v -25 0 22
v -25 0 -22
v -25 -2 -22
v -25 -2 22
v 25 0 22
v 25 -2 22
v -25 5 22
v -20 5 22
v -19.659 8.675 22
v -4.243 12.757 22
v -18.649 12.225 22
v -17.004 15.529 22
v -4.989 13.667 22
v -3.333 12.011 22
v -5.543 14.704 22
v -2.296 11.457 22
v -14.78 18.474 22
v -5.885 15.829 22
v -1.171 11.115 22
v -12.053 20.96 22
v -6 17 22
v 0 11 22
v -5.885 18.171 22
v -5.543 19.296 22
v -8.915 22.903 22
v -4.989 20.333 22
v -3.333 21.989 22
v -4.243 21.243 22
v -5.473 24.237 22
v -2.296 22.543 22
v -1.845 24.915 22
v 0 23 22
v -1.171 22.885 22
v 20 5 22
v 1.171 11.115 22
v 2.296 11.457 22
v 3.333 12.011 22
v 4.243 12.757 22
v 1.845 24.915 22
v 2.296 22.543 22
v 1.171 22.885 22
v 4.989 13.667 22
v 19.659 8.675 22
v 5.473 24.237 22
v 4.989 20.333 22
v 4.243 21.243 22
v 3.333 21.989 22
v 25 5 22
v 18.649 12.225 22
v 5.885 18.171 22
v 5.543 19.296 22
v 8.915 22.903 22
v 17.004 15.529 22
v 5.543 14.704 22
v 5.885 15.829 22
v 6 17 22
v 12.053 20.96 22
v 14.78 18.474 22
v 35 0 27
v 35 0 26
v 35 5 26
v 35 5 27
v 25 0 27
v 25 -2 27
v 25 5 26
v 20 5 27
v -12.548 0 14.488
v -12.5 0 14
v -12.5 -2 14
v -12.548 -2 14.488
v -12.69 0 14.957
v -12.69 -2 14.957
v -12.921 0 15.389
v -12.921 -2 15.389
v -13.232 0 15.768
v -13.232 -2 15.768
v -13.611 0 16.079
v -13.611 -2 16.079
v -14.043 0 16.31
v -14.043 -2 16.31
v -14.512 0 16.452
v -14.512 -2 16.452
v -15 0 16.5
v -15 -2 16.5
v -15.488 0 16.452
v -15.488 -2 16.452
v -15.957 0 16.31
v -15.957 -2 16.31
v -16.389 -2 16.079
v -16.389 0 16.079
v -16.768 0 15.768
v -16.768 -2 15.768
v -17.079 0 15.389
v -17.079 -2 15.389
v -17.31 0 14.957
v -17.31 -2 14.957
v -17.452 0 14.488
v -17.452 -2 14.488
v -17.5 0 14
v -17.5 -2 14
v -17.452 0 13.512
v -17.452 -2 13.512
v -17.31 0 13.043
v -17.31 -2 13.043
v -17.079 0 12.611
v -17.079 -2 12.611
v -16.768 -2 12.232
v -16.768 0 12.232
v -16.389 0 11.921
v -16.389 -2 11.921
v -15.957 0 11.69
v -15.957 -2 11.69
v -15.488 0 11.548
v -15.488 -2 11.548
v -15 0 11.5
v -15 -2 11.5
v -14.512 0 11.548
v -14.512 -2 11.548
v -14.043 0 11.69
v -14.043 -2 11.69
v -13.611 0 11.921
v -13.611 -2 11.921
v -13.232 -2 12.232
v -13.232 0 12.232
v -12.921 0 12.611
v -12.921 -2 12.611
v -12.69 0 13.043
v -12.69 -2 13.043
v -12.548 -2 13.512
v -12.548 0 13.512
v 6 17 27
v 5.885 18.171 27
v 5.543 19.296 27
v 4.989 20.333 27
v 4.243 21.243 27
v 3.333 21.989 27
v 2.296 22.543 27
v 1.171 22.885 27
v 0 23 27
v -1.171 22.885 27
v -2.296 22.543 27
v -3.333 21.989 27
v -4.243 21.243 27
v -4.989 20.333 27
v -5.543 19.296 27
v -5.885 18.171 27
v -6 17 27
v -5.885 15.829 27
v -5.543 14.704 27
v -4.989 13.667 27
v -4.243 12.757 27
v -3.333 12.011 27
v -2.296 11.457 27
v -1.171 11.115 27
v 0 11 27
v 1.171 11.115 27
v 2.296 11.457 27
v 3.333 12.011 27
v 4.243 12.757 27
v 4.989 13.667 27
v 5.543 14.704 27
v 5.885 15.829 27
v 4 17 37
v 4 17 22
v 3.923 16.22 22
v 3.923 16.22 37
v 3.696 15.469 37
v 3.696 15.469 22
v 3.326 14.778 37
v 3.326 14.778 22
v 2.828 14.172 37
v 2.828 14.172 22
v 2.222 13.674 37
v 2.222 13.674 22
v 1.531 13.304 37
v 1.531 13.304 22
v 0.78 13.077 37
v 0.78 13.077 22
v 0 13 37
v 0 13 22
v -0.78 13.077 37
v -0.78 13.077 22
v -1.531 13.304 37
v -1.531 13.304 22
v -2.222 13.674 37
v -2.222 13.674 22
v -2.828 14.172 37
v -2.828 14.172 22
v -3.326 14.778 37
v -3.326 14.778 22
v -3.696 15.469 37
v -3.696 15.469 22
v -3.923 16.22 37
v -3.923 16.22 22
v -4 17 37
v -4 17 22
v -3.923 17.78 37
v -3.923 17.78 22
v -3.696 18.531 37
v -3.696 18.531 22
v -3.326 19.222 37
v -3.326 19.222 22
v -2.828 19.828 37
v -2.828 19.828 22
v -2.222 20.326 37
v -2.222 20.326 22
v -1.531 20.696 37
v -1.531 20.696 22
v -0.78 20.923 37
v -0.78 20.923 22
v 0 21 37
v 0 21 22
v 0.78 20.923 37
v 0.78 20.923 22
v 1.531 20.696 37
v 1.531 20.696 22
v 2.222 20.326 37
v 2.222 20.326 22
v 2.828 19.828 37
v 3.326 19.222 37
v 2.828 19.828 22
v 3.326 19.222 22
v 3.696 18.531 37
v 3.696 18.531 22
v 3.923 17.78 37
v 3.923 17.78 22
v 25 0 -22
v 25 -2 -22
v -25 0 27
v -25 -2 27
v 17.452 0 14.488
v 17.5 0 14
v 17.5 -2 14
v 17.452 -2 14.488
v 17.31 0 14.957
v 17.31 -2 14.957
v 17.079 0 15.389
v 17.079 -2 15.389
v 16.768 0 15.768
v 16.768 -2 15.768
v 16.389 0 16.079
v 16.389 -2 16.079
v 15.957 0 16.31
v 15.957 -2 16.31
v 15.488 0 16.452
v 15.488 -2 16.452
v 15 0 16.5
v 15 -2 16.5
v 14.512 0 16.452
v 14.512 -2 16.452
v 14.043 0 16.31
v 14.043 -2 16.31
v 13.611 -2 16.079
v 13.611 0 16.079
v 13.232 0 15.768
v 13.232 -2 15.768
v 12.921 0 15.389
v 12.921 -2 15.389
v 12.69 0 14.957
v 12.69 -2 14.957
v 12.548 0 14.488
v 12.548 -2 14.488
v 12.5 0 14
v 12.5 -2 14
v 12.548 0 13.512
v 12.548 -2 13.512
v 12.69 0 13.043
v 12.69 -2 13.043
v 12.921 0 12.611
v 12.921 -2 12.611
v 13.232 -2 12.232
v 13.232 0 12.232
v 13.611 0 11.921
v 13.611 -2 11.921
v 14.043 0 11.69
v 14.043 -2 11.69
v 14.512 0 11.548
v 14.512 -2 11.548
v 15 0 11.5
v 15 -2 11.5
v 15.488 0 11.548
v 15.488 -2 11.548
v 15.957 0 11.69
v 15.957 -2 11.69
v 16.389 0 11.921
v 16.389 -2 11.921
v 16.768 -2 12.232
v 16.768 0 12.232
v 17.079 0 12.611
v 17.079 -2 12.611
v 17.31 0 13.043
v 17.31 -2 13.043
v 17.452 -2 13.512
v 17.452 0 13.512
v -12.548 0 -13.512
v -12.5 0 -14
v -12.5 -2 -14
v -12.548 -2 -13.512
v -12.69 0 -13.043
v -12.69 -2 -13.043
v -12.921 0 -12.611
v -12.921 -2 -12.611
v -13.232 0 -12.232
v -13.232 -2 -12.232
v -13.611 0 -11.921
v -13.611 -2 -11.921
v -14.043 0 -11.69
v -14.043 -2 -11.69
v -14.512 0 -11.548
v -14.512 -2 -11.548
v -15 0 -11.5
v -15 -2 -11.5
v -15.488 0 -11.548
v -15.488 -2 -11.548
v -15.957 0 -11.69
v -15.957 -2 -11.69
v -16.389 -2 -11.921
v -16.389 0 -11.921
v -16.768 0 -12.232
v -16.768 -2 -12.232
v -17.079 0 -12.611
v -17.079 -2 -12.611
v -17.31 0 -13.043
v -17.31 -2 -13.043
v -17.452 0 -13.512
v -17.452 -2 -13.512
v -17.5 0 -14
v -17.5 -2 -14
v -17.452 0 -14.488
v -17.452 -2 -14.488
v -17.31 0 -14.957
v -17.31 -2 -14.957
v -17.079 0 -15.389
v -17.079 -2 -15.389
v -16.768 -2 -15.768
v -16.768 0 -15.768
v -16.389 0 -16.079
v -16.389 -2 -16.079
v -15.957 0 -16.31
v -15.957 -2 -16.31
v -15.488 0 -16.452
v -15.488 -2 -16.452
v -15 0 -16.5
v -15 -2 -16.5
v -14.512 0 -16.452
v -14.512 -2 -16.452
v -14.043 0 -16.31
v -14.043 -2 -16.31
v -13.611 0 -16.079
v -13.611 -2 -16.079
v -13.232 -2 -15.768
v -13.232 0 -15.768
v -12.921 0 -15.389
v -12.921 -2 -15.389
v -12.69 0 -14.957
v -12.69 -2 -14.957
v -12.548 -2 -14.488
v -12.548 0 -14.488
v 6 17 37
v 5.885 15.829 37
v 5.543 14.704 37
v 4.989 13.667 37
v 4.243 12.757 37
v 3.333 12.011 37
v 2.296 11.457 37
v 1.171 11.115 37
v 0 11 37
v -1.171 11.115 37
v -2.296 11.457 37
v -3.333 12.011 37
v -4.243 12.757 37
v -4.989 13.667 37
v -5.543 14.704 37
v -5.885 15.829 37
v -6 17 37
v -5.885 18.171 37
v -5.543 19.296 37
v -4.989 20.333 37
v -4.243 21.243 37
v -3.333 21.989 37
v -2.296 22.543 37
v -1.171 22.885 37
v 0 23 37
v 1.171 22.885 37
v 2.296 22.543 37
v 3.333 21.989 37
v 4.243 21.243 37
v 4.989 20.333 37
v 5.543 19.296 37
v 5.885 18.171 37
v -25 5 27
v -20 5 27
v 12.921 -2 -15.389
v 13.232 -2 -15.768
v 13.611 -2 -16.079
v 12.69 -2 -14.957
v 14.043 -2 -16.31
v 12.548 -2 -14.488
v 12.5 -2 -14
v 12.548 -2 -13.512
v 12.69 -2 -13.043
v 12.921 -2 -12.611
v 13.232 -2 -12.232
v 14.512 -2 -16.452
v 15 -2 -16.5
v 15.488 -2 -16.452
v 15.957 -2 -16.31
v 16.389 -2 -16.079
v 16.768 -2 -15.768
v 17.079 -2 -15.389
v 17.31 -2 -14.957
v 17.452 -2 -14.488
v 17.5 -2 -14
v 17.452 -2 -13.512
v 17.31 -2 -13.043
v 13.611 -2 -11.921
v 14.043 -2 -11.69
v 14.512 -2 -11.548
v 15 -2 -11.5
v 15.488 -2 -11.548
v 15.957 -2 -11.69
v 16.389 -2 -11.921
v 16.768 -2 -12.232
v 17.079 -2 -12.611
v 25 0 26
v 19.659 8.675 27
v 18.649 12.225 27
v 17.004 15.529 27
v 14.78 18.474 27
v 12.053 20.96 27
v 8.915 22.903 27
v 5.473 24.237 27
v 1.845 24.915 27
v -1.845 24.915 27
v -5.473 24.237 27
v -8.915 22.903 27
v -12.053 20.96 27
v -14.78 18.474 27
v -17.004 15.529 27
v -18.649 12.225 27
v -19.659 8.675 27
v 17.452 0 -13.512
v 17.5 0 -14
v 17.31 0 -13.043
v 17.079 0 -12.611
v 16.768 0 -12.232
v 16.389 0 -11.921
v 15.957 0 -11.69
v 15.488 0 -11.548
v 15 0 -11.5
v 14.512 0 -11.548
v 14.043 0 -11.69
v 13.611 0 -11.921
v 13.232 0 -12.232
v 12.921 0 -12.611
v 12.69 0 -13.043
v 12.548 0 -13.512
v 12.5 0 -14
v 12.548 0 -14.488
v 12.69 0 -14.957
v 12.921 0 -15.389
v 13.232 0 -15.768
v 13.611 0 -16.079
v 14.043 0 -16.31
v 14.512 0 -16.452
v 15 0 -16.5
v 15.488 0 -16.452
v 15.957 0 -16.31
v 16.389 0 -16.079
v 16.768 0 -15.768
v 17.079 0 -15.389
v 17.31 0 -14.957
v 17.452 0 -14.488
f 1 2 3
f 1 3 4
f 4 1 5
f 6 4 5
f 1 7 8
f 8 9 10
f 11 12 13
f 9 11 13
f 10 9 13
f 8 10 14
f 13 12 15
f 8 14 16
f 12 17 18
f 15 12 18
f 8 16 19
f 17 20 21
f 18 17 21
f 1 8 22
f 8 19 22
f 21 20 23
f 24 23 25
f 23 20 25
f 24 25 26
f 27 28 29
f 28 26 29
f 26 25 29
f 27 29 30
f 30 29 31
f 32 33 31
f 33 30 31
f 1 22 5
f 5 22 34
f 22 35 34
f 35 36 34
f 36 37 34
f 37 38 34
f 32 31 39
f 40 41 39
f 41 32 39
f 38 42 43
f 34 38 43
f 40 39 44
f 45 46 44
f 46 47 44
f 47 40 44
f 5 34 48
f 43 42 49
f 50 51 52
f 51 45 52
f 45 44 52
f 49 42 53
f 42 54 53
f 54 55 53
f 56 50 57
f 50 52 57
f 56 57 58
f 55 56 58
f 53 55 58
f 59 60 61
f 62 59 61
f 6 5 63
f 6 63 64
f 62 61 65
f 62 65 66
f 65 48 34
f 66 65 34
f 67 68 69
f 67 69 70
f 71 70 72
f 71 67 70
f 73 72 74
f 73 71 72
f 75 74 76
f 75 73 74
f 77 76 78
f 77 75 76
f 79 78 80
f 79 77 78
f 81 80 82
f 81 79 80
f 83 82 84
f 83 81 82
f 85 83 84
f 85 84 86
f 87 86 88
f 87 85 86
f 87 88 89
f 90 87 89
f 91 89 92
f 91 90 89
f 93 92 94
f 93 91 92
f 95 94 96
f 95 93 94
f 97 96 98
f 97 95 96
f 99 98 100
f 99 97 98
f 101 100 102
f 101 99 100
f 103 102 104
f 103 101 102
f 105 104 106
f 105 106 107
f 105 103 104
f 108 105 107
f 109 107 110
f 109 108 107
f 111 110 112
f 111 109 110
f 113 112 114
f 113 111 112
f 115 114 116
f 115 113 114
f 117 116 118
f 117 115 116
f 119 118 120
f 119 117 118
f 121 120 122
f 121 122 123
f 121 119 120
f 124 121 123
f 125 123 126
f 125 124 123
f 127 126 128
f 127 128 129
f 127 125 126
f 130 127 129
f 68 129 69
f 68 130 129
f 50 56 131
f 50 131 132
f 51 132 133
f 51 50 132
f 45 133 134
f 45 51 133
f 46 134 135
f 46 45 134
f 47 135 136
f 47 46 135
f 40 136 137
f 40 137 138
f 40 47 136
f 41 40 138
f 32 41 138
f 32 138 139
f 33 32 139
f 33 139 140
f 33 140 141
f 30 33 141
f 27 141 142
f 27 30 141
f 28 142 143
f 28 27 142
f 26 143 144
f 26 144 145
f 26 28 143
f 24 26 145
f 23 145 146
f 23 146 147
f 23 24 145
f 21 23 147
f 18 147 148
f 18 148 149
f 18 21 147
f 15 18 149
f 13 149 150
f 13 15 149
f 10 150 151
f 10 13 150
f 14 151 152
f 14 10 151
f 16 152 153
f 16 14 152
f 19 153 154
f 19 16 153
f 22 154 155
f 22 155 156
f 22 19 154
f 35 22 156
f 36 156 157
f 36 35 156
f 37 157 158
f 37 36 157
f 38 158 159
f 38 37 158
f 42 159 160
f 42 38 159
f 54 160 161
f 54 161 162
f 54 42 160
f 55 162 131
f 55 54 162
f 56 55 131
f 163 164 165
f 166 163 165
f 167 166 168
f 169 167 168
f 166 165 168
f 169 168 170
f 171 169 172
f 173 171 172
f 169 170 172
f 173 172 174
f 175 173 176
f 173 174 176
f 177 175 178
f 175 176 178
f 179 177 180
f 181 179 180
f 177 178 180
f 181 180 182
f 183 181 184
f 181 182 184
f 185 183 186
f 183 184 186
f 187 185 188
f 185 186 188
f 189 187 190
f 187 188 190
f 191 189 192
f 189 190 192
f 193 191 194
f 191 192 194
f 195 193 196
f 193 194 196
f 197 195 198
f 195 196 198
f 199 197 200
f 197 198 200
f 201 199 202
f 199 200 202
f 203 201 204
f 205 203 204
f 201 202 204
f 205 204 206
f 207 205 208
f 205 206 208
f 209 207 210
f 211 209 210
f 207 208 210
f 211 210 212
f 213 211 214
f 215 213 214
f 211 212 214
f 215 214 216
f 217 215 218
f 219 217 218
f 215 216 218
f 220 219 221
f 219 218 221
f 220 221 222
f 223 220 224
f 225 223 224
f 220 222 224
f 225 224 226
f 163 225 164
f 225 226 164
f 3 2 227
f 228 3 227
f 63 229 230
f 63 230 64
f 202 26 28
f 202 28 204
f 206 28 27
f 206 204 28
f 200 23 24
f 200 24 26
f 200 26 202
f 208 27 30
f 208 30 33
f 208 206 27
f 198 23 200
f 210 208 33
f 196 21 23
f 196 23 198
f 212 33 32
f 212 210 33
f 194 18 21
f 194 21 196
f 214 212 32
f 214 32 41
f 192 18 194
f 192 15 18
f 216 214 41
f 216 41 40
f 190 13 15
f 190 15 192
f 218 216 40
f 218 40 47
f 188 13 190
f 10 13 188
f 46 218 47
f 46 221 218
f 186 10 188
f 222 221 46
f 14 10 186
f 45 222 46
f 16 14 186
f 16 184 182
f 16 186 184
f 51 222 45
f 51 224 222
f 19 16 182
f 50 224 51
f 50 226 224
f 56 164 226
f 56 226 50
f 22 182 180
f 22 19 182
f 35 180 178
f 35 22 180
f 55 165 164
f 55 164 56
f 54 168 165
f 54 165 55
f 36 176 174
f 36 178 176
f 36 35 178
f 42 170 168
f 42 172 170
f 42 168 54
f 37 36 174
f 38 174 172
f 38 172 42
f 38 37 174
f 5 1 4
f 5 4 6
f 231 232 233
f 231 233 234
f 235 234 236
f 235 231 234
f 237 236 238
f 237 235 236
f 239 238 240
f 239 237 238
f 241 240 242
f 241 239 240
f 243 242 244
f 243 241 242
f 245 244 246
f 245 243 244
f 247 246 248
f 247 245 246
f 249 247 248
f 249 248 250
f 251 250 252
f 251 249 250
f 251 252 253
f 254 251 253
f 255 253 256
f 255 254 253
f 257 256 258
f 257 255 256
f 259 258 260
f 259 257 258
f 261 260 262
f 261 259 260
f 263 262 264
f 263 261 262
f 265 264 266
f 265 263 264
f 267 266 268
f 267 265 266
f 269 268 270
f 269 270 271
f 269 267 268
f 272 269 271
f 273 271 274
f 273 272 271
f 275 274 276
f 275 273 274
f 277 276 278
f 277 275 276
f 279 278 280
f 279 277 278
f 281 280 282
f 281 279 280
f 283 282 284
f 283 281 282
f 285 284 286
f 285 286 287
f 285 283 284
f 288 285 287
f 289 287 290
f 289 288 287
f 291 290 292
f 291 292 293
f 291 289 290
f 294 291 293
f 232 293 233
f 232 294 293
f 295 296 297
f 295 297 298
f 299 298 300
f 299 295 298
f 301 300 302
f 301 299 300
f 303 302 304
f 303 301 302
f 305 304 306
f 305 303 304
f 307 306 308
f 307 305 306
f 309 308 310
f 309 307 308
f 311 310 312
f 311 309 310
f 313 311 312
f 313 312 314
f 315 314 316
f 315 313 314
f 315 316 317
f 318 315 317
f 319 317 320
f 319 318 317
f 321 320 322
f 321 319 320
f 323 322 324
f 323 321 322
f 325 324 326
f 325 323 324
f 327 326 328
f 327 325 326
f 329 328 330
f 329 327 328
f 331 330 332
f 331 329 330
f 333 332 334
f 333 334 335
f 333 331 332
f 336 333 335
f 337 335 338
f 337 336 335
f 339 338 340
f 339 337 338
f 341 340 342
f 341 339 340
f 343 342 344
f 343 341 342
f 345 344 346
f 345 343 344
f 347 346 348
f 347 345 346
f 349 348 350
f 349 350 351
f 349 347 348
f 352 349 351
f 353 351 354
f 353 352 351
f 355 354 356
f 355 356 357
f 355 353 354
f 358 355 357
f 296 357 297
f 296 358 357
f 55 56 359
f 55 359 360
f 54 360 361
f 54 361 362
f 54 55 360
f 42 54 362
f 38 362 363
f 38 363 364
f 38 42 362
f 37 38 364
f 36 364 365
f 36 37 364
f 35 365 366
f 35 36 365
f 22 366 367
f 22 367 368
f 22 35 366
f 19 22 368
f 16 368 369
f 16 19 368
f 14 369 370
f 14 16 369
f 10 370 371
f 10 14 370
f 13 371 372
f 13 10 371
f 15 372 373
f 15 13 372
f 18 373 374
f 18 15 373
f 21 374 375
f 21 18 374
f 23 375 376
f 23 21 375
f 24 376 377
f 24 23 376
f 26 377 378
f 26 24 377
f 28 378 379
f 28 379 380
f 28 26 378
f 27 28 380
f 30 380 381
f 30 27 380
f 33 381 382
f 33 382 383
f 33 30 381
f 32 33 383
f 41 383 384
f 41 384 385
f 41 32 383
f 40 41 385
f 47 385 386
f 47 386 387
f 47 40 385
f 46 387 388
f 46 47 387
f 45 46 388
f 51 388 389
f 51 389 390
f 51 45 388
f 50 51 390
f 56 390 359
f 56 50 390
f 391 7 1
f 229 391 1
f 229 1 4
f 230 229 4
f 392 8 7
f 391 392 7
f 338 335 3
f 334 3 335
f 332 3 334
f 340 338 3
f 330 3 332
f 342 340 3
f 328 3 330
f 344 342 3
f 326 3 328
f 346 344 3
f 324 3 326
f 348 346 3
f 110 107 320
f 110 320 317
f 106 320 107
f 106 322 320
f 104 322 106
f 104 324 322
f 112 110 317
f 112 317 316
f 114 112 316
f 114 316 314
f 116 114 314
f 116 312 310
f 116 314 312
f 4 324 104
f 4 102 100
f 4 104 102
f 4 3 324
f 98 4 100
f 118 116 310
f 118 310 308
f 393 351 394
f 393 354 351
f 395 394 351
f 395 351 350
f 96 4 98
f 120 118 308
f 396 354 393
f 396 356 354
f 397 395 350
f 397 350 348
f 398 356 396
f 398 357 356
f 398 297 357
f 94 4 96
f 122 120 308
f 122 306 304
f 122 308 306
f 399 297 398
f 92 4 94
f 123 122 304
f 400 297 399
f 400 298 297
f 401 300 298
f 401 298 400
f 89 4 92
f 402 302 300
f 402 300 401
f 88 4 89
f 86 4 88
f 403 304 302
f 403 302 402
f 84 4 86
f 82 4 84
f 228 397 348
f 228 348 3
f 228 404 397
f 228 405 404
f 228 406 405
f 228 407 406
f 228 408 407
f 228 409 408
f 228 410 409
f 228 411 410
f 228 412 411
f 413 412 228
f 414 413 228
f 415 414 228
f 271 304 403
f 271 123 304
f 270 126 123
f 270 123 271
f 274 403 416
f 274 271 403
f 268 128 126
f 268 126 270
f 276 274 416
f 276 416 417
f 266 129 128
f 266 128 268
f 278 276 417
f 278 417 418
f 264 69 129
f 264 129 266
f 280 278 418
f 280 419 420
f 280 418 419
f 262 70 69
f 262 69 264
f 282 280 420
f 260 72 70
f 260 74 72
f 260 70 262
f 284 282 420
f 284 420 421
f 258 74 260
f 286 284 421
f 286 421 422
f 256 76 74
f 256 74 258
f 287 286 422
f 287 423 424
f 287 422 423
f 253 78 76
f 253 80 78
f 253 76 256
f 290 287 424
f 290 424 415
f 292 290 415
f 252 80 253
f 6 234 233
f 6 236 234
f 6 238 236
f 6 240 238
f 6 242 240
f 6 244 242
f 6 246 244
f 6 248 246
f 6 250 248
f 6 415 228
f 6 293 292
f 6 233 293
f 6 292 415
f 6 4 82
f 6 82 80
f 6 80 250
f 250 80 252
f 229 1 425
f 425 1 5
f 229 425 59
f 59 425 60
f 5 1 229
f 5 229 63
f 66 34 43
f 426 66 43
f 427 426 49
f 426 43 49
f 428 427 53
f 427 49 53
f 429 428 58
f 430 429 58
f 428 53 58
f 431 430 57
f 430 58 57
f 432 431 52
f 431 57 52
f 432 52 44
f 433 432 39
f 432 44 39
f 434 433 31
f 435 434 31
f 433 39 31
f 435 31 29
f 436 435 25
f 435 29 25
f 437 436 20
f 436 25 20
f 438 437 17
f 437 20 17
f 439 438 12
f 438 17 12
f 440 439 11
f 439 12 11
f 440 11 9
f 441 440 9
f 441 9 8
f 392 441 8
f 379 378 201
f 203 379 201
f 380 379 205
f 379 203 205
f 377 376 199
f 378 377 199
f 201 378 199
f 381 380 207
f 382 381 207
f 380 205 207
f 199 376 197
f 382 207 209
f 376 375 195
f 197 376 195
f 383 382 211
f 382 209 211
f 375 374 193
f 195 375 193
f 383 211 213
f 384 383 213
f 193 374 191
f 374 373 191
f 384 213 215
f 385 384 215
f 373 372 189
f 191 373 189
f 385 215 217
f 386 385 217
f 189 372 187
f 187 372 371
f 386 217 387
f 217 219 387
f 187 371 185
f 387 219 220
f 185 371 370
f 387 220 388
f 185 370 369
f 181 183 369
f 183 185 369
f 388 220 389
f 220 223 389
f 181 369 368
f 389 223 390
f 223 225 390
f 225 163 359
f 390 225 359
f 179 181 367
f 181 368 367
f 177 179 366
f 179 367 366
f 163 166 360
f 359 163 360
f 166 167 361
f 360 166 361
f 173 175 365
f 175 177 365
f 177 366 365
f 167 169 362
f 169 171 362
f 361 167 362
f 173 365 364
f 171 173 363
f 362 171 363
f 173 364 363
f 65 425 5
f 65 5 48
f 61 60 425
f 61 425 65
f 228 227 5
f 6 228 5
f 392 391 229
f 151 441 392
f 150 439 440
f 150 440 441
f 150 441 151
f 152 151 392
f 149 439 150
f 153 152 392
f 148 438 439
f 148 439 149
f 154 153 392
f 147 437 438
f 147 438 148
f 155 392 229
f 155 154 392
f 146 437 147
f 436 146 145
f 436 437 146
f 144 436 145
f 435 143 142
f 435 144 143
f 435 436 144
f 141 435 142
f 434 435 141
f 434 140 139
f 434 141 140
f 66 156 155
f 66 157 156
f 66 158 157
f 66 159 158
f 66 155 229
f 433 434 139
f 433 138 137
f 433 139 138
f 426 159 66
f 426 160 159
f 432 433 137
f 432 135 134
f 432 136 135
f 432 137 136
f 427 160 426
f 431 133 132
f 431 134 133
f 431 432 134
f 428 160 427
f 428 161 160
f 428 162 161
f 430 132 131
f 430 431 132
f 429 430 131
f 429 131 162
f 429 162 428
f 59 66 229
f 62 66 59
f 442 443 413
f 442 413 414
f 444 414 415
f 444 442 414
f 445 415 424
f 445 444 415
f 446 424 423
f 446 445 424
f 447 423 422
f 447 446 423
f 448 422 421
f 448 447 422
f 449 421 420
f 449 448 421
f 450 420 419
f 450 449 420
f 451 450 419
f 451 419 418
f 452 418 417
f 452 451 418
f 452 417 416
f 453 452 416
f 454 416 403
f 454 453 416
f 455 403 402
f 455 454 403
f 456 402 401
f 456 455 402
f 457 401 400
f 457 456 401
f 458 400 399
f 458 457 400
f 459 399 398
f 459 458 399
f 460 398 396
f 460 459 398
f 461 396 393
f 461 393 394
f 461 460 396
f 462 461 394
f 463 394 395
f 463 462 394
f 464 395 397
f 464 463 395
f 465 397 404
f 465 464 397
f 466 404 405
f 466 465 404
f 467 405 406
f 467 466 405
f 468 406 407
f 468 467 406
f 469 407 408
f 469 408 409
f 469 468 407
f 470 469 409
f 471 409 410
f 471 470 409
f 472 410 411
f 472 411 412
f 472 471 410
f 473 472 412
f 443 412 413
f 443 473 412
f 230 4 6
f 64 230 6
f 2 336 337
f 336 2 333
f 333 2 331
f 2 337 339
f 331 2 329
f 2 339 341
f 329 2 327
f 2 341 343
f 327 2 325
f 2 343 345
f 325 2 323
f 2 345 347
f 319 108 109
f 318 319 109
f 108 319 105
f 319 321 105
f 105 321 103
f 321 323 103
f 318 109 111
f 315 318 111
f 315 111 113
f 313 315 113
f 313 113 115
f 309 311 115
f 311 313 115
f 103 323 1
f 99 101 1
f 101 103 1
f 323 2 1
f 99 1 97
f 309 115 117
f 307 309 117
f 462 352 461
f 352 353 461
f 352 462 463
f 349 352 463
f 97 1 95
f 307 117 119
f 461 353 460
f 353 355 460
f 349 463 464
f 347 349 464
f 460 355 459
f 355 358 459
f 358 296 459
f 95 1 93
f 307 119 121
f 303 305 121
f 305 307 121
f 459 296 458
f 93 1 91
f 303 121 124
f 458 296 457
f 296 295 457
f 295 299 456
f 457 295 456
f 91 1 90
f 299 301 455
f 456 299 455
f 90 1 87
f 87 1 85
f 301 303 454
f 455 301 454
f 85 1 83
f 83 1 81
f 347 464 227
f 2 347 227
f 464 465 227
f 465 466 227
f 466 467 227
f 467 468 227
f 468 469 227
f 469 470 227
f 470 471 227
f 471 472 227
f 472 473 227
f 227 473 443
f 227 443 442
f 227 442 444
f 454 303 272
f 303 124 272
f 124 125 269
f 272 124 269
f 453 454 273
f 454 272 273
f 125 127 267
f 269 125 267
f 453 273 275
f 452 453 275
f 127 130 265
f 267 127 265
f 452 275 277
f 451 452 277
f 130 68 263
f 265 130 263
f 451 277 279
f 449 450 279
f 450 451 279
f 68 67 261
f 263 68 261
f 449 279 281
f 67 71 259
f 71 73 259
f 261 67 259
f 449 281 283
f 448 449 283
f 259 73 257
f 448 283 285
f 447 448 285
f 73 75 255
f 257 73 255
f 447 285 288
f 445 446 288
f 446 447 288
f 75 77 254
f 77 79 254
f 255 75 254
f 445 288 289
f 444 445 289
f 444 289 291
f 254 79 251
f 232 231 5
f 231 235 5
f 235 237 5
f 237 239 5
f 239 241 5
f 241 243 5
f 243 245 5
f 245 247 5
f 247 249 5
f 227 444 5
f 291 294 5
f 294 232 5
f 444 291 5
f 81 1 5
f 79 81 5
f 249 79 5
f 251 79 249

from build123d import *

# Parameters (mm, degrees)
F0_W       = 50
F0_H       = 44
F0_R       = 2.5
F1_DEPTH   = 2
F1_FACE1_W = 50
F1_FACE1_H = 2
F2_R       = 6
F3_DEPTH   = 5
F4_DEPTH   = 5
F5_R       = 6
F5_R_2     = 4
F6_DEPTH   = 15
F7_W       = 5
F7_H       = 4
F8_DEPTH   = 10


with BuildPart() as f1:
    # F0 (on Front) → F1 (new body)
    with BuildSketch(Plane.XZ):
        Rectangle(F0_W, F0_H)
        with Locations((-15, -14)):
            Circle(F0_R, mode=Mode.SUBTRACT)
        with Locations((15, -14)):
            Circle(F0_R, mode=Mode.SUBTRACT)
        with Locations((-15, 14)):
            Circle(F0_R, mode=Mode.SUBTRACT)
        with Locations((15, 14)):
            Circle(F0_R, mode=Mode.SUBTRACT)
    extrude(amount=F1_DEPTH)

    # F1_face1 (on face) + F2 (on face) → F3 (join)
    with BuildSketch(Plane(origin=(0, -1, -22), x_dir=(1, 0, 0), z_dir=(0, 0, -1))):
        Rectangle(F1_FACE1_W, F1_FACE1_H)
    with BuildSketch(Plane.XY.offset(22)):
        Polygon((-25, 5), (-25, 0), (25, 0), (35, 0), (35, 5), (20, 5), (-20, 5), align=None)
        with BuildLine():
            ThreePointArc((20, 5), (0, 25), (-20, 5))
            Line((-20, 5), (20, 5))
        make_face()
        with Locations((0, 17)):
            Circle(F2_R, mode=Mode.SUBTRACT)
    extrude(amount=-F3_DEPTH, dir=(0, 0, -1))


with BuildPart() as f4:
    # F4 (new): a face of the model
    f4_faces = [f1.part.faces().sort_by_distance(p)[0] for p in [
        (0, -1, 22),
    ]]
    extrude(f4_faces, amount=F4_DEPTH)


with BuildPart() as f6:
    # F5 (on face) → F6 (new body)
    with BuildSketch(Plane(origin=(0, 0, 22), x_dir=(1, 0, 0), z_dir=(0, 0, -1))):
        with Locations((0, -17)):
            Circle(F5_R)
        with Locations((0, -17)):
            Circle(F5_R_2, mode=Mode.SUBTRACT)
    extrude(amount=-F6_DEPTH)


with BuildPart() as f1_1:
    add(f1.part)

    # F7 (on face) → F8 (cut)
    with BuildSketch(Plane.YZ.offset(35)):
        with Locations((2.5, 24)):
            Rectangle(F7_W, F7_H)
    extrude(amount=-F8_DEPTH, mode=Mode.SUBTRACT)


solid = Compound([f4.part, f6.part, f1_1.part])
